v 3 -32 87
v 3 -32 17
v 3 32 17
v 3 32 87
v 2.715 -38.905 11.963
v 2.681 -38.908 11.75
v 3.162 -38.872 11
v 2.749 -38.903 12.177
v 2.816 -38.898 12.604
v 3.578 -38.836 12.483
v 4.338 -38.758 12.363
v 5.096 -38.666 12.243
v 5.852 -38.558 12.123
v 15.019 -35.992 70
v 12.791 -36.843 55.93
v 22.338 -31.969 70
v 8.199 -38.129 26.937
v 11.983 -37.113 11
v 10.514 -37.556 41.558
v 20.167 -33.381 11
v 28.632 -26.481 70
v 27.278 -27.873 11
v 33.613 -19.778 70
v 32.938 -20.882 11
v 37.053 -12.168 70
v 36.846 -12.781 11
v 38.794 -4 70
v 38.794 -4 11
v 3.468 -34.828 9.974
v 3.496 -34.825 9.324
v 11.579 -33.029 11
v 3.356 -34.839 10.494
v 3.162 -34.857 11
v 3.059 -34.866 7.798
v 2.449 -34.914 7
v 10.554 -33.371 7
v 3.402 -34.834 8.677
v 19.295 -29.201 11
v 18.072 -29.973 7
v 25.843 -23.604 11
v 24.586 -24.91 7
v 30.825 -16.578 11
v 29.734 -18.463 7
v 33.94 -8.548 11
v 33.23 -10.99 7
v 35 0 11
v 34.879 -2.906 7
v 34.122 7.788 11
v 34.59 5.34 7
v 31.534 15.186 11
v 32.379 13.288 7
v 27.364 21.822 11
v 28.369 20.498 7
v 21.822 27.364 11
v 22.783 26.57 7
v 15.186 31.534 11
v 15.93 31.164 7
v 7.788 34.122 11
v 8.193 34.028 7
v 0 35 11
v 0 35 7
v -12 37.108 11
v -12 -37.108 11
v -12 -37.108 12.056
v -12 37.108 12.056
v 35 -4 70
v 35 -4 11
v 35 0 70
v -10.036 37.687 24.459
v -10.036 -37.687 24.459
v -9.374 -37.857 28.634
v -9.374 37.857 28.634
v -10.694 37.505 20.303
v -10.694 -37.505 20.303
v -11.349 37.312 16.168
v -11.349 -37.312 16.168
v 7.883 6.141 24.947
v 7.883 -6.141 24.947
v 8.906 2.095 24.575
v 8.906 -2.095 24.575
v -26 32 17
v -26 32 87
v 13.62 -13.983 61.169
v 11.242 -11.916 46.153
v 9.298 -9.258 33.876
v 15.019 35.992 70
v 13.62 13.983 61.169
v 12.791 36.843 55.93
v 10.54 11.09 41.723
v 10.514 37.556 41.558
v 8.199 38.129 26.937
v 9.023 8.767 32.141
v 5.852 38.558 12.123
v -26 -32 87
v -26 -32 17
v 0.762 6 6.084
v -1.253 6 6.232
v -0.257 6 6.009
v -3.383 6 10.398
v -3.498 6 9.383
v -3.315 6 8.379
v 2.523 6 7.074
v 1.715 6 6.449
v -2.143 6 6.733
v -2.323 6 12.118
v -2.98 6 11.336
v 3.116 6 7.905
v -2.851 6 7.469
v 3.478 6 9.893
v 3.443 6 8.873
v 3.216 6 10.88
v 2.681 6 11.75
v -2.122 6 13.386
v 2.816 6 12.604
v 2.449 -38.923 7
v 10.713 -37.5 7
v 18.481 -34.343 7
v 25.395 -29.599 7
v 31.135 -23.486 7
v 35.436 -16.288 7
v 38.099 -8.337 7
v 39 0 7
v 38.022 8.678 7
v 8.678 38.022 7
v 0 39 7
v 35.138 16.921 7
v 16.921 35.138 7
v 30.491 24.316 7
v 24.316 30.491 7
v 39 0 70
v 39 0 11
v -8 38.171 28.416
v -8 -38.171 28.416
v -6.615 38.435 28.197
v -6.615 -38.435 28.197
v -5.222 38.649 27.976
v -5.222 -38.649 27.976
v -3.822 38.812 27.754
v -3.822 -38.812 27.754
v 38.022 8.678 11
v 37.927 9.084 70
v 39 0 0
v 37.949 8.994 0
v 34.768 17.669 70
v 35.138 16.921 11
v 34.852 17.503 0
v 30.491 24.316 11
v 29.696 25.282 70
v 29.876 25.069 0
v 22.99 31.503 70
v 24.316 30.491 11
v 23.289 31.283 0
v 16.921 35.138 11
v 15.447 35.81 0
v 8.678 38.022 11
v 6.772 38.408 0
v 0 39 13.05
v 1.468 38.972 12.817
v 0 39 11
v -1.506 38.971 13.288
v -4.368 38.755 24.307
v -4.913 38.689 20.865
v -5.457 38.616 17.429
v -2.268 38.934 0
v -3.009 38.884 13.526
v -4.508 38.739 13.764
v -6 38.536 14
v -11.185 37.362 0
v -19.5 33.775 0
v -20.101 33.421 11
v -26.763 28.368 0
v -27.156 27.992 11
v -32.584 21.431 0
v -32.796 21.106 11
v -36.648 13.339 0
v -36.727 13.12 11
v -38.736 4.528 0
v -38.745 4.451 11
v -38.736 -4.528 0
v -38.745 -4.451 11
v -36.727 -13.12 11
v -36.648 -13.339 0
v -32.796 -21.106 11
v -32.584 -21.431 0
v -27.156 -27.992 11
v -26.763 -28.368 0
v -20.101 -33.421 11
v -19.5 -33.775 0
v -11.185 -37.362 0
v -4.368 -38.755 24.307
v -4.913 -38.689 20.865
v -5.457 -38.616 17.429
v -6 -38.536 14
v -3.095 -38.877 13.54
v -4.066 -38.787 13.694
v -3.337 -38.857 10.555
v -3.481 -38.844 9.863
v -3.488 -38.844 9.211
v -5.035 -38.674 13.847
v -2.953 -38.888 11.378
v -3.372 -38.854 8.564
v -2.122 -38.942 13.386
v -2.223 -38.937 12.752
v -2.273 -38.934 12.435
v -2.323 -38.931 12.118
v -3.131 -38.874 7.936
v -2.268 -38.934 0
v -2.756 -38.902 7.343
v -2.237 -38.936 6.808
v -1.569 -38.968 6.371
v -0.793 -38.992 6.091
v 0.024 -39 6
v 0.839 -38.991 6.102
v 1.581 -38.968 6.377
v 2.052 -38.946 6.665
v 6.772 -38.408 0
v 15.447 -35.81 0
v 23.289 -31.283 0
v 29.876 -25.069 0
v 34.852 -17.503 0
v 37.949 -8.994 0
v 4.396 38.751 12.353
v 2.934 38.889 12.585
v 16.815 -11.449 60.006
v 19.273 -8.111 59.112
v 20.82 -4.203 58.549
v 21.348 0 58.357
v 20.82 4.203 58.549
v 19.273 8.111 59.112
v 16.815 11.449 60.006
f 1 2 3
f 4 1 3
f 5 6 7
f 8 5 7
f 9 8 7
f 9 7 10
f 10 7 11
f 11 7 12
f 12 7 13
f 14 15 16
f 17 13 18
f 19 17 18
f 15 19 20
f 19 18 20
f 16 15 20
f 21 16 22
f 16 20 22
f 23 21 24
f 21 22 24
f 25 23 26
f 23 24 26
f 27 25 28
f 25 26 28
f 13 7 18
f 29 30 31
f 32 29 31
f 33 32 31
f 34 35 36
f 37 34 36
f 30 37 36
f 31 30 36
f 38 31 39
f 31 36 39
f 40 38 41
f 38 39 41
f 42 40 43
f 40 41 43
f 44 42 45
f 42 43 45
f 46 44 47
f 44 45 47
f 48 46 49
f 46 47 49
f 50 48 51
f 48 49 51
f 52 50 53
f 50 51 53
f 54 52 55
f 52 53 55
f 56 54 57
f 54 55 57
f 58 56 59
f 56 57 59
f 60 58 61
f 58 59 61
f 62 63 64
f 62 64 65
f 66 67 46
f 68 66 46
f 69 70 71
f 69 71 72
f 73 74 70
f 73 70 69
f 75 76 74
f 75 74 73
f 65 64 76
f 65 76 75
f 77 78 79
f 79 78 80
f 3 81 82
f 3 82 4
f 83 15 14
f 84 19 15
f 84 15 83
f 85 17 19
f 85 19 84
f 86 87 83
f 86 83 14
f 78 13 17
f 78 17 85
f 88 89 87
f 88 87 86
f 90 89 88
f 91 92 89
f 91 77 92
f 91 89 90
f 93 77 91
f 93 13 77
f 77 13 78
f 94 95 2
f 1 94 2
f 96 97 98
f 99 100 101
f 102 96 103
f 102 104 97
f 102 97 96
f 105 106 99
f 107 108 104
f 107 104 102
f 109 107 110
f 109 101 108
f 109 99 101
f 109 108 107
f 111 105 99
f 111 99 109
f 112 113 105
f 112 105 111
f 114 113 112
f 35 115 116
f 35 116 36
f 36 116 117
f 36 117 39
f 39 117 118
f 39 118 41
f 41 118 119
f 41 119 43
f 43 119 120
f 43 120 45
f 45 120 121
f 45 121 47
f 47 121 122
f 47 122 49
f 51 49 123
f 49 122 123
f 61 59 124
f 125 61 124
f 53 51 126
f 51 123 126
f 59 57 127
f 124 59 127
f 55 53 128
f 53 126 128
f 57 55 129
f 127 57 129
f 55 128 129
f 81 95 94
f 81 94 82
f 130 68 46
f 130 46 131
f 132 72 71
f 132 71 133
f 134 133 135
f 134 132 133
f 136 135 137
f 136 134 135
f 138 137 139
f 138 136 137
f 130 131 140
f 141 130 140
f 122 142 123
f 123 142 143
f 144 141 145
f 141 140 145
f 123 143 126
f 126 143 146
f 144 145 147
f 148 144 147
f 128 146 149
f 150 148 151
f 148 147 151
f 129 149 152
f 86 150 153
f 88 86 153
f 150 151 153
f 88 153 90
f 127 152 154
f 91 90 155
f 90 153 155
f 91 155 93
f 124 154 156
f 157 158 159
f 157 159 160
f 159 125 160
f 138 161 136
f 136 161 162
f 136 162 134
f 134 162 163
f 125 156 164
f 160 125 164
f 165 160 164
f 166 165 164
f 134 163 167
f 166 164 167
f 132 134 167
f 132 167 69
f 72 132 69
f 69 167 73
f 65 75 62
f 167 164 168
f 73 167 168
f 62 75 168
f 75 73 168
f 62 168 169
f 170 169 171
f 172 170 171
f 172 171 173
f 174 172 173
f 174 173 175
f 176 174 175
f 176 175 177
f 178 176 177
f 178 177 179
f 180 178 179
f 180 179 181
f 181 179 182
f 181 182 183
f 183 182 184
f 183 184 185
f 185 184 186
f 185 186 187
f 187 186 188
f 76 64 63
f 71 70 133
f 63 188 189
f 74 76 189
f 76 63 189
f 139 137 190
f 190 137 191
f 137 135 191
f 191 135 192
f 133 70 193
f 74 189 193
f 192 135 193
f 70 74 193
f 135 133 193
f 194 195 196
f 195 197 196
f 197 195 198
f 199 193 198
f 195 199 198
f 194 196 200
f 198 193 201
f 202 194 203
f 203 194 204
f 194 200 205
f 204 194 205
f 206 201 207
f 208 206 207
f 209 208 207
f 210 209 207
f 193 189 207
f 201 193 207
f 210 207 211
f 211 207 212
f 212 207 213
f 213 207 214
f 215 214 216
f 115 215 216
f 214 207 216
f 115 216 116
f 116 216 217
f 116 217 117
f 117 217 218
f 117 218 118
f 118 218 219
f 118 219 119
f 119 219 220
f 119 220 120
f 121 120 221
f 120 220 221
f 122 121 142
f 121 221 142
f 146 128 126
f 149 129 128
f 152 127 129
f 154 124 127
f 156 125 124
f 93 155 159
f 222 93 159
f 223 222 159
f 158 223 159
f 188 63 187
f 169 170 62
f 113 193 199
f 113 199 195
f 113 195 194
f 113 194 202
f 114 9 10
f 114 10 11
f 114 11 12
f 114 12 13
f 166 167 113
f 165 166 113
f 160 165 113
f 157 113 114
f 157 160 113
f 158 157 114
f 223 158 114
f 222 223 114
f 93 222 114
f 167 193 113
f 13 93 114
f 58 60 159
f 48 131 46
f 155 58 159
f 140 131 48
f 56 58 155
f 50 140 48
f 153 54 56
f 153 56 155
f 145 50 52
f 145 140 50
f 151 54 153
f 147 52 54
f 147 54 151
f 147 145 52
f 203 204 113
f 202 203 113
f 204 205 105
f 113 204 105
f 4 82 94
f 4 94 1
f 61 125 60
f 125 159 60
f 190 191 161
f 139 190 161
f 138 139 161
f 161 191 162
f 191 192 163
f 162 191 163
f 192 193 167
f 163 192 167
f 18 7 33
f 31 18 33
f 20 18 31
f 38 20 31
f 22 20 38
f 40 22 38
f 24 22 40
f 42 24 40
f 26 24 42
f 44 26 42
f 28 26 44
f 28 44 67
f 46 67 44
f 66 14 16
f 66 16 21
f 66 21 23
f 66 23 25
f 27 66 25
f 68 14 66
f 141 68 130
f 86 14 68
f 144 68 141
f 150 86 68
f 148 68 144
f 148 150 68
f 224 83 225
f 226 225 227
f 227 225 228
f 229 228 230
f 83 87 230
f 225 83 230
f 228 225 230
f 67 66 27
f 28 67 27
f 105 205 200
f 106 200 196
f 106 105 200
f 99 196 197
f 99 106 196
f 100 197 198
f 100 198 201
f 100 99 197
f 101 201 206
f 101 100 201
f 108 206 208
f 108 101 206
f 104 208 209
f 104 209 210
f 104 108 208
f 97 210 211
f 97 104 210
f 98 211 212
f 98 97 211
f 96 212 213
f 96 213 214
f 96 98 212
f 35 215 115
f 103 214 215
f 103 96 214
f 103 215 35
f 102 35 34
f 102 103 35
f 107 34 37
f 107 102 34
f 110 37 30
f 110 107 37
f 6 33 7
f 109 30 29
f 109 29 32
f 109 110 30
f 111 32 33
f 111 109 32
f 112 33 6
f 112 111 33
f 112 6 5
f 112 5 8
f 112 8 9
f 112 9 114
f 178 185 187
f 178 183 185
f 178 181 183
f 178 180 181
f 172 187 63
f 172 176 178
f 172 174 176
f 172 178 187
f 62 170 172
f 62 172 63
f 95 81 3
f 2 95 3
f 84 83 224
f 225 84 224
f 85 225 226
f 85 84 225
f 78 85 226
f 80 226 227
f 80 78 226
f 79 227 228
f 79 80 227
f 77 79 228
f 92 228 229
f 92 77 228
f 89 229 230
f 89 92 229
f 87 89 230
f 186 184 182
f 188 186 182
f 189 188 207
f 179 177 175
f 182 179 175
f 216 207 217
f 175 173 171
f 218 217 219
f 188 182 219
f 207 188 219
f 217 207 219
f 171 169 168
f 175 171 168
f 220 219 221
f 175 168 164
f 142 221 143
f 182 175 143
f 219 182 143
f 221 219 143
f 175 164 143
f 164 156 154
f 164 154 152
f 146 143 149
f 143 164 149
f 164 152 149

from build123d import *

# Parameters (mm, degrees)
BOX003_W                    = 29
BOX003_H                    = 64
BOX003_DEPTH                = 70
BOX006_W                    = 20
BOX006_H                    = 79
BOX006_DEPTH                = 44
BOX006_PLACEMENT_ANGLE      = 9
BOX_W                       = 12
BOX_H                       = 78
BOX_DEPTH                   = 150
BOX_PLACEMENT_ANGLE         = 9
BOX001_W                    = 12
BOX001_H                    = 78
BOX001_DEPTH                = 150
BOX001_PLACEMENT_ANGLE      = 9
BOX002_W                    = 29
BOX002_H                    = 78
BOX002_DEPTH                = 150
CYLINDER004_R               = 16
CYLINDER004_DEPTH           = 36
CYLINDER004_PLACEMENT_ANGLE = 20
CYLINDER001_R               = 3.5
CYLINDER001_DEPTH           = 47
BOX005_W                    = 5
BOX005_H                    = 45
BOX005_DEPTH                = 10
BOX005_PLACEMENT_ANGLE      = 9
CYLINDER003_R               = 35
CYLINDER003_DEPTH           = 4
BOX004_W                    = 4
BOX004_H                    = 4
BOX004_DEPTH                = 83
CYLINDER002_W               = 39
CYLINDER002_H               = 4
CYLINDER002_ANGLE           = 180
CYLINDER_R                  = 39
CYLINDER_DEPTH              = 70


with BuildPart() as front_hole_small:
    # Box003 → Box003 (new body)
    with BuildSketch(Plane(origin=(-26, -32, 17), x_dir=(1, 0, 0), z_dir=(0, 0, 1))):
        with Locations((14.5, 32)):
            Rectangle(BOX003_W, BOX003_H)
    extrude(amount=BOX003_DEPTH)


with BuildPart() as arm_cutter:
    # Box006 → Box006 (new body)
    with BuildSketch(Plane.XY):
        with Locations((10, 39.5)):
            Rectangle(BOX006_W, BOX006_H)
    extrude(amount=BOX006_DEPTH)


with BuildPart() as arm_cutter_1:
    # Box006 placement: moved
    add(arm_cutter.part.moved(Location((-18, -40, 30))).rotate(Axis((-18, -40, 30), (0, 1, 0)), BOX006_PLACEMENT_ANGLE))


with BuildPart() as phone_model:
    # Box → Box (new body)
    with BuildSketch(Plane.XY):
        with Locations((6, 39)):
            Rectangle(BOX_W, BOX_H)
    extrude(amount=BOX_DEPTH)


with BuildPart() as phone_model_1:
    # Box placement: moved
    add(phone_model.part.moved(Location((-6, -39, 14))).rotate(Axis((-6, -39, 14), (0, 1, 0)), BOX_PLACEMENT_ANGLE))


with BuildPart() as front_hole:
    # Box001 → Box001 (new body)
    with BuildSketch(Plane.XY):
        with Locations((6, 39)):
            Rectangle(BOX001_W, BOX001_H)
    extrude(amount=BOX001_DEPTH)


with BuildPart() as front_hole_1:
    # Box001 placement: moved
    add(front_hole.part.moved(Location((-24, -39, 13))).rotate(Axis((-24, -39, 13), (0, 1, 0)), BOX001_PLACEMENT_ANGLE))


with BuildPart() as front_hole_big:
    # Box002 → Box002 (new body)
    with BuildSketch(Plane(origin=(-41, -39, 11), x_dir=(1, 0, 0), z_dir=(0, 0, 1))):
        with Locations((14.5, 39)):
            Rectangle(BOX002_W, BOX002_H)
    extrude(amount=BOX002_DEPTH)


with BuildPart() as holes:
    # Cylinder004 → Cylinder004 (new body)
    with BuildSketch(Plane.XY):
        Circle(CYLINDER004_R)
    extrude(amount=CYLINDER004_DEPTH)


with BuildPart() as holes_1:
    # Cylinder004 placement: moved
    add(holes.part.moved(Location((-6, 0, 30))).rotate(Axis((-6, 0, 30), (0, 1, 0)), CYLINDER004_PLACEMENT_ANGLE))

    # Fusion: union arm_cutter, phone_model, front_hole, front_hole_big
    add(arm_cutter_1.part)
    add(phone_model_1.part)
    add(front_hole_1.part)
    add(front_hole_big.part)


with BuildPart() as cylinder:
    # Cylinder001 → Cylinder001 (new body)
    with BuildSketch(Plane(origin=(0, 6, 9.5), x_dir=(1, 0, 0), z_dir=(0, -1, 0))):
        Circle(CYLINDER001_R)
    extrude(amount=CYLINDER001_DEPTH)


with BuildPart() as plug_cube:
    # Box005 → Box005 (new body)
    with BuildSketch(Plane.XY):
        with Locations((2.5, 22.5)):
            Rectangle(BOX005_W, BOX005_H)
    extrude(amount=BOX005_DEPTH)


with BuildPart() as plug_cube_1:
    # Box005 placement: moved
    add(plug_cube.part.moved(Location((-2.5, -39, 11))).rotate(Axis((-2.5, -39, 11), (0, 1, 0)), BOX005_PLACEMENT_ANGLE))


with BuildPart() as cord_hole_inner:
    # Cylinder003 → Cylinder003 (new body)
    with BuildSketch(Plane.XY):
        Circle(CYLINDER003_R)
    extrude(amount=CYLINDER003_DEPTH)


with BuildPart() as cube:
    # Box004 → Box004 (new body)
    with BuildSketch(Plane(origin=(35, -4, 0), x_dir=(1, 0, 0), z_dir=(0, 0, 1))):
        with Locations((2, 2)):
            Rectangle(BOX004_W, BOX004_H)
    extrude(amount=BOX004_DEPTH)


with BuildPart() as negative:
    # Cylinder002 → Cylinder002 (revolve)
    with BuildSketch(Plane(origin=(0, 0, 0), x_dir=(0, -1, 0), z_dir=(-1, 0, 0))):
        with Locations((19.5, 2)):
            Rectangle(CYLINDER002_W, CYLINDER002_H)
    revolve(axis=Axis((0, 0, 0), (0, 0, 1)), revolution_arc=CYLINDER002_ANGLE)

    # Fusion001: union Cube
    add(cube.part)

    # Cut001: cut cord_hole_inner
    add(cord_hole_inner.part, mode=Mode.SUBTRACT)


with BuildPart() as negative_1:
    # Cut001 placement: moved
    add(negative.part.moved(Location((0, 0, 7))))

    # Fusion002: union Cylinder, plug_cube
    add(cylinder.part)
    add(plug_cube_1.part)

    # Fusion003: union holes
    add(holes_1.part)


with BuildPart() as cut:
    # Cylinder → Cylinder (new body)
    with BuildSketch(Plane.XY):
        Circle(CYLINDER_R)
    extrude(amount=CYLINDER_DEPTH)

    # Cut: cut negative
    add(negative_1.part, mode=Mode.SUBTRACT)


solid = Compound([front_hole_small.part, cut.part])
